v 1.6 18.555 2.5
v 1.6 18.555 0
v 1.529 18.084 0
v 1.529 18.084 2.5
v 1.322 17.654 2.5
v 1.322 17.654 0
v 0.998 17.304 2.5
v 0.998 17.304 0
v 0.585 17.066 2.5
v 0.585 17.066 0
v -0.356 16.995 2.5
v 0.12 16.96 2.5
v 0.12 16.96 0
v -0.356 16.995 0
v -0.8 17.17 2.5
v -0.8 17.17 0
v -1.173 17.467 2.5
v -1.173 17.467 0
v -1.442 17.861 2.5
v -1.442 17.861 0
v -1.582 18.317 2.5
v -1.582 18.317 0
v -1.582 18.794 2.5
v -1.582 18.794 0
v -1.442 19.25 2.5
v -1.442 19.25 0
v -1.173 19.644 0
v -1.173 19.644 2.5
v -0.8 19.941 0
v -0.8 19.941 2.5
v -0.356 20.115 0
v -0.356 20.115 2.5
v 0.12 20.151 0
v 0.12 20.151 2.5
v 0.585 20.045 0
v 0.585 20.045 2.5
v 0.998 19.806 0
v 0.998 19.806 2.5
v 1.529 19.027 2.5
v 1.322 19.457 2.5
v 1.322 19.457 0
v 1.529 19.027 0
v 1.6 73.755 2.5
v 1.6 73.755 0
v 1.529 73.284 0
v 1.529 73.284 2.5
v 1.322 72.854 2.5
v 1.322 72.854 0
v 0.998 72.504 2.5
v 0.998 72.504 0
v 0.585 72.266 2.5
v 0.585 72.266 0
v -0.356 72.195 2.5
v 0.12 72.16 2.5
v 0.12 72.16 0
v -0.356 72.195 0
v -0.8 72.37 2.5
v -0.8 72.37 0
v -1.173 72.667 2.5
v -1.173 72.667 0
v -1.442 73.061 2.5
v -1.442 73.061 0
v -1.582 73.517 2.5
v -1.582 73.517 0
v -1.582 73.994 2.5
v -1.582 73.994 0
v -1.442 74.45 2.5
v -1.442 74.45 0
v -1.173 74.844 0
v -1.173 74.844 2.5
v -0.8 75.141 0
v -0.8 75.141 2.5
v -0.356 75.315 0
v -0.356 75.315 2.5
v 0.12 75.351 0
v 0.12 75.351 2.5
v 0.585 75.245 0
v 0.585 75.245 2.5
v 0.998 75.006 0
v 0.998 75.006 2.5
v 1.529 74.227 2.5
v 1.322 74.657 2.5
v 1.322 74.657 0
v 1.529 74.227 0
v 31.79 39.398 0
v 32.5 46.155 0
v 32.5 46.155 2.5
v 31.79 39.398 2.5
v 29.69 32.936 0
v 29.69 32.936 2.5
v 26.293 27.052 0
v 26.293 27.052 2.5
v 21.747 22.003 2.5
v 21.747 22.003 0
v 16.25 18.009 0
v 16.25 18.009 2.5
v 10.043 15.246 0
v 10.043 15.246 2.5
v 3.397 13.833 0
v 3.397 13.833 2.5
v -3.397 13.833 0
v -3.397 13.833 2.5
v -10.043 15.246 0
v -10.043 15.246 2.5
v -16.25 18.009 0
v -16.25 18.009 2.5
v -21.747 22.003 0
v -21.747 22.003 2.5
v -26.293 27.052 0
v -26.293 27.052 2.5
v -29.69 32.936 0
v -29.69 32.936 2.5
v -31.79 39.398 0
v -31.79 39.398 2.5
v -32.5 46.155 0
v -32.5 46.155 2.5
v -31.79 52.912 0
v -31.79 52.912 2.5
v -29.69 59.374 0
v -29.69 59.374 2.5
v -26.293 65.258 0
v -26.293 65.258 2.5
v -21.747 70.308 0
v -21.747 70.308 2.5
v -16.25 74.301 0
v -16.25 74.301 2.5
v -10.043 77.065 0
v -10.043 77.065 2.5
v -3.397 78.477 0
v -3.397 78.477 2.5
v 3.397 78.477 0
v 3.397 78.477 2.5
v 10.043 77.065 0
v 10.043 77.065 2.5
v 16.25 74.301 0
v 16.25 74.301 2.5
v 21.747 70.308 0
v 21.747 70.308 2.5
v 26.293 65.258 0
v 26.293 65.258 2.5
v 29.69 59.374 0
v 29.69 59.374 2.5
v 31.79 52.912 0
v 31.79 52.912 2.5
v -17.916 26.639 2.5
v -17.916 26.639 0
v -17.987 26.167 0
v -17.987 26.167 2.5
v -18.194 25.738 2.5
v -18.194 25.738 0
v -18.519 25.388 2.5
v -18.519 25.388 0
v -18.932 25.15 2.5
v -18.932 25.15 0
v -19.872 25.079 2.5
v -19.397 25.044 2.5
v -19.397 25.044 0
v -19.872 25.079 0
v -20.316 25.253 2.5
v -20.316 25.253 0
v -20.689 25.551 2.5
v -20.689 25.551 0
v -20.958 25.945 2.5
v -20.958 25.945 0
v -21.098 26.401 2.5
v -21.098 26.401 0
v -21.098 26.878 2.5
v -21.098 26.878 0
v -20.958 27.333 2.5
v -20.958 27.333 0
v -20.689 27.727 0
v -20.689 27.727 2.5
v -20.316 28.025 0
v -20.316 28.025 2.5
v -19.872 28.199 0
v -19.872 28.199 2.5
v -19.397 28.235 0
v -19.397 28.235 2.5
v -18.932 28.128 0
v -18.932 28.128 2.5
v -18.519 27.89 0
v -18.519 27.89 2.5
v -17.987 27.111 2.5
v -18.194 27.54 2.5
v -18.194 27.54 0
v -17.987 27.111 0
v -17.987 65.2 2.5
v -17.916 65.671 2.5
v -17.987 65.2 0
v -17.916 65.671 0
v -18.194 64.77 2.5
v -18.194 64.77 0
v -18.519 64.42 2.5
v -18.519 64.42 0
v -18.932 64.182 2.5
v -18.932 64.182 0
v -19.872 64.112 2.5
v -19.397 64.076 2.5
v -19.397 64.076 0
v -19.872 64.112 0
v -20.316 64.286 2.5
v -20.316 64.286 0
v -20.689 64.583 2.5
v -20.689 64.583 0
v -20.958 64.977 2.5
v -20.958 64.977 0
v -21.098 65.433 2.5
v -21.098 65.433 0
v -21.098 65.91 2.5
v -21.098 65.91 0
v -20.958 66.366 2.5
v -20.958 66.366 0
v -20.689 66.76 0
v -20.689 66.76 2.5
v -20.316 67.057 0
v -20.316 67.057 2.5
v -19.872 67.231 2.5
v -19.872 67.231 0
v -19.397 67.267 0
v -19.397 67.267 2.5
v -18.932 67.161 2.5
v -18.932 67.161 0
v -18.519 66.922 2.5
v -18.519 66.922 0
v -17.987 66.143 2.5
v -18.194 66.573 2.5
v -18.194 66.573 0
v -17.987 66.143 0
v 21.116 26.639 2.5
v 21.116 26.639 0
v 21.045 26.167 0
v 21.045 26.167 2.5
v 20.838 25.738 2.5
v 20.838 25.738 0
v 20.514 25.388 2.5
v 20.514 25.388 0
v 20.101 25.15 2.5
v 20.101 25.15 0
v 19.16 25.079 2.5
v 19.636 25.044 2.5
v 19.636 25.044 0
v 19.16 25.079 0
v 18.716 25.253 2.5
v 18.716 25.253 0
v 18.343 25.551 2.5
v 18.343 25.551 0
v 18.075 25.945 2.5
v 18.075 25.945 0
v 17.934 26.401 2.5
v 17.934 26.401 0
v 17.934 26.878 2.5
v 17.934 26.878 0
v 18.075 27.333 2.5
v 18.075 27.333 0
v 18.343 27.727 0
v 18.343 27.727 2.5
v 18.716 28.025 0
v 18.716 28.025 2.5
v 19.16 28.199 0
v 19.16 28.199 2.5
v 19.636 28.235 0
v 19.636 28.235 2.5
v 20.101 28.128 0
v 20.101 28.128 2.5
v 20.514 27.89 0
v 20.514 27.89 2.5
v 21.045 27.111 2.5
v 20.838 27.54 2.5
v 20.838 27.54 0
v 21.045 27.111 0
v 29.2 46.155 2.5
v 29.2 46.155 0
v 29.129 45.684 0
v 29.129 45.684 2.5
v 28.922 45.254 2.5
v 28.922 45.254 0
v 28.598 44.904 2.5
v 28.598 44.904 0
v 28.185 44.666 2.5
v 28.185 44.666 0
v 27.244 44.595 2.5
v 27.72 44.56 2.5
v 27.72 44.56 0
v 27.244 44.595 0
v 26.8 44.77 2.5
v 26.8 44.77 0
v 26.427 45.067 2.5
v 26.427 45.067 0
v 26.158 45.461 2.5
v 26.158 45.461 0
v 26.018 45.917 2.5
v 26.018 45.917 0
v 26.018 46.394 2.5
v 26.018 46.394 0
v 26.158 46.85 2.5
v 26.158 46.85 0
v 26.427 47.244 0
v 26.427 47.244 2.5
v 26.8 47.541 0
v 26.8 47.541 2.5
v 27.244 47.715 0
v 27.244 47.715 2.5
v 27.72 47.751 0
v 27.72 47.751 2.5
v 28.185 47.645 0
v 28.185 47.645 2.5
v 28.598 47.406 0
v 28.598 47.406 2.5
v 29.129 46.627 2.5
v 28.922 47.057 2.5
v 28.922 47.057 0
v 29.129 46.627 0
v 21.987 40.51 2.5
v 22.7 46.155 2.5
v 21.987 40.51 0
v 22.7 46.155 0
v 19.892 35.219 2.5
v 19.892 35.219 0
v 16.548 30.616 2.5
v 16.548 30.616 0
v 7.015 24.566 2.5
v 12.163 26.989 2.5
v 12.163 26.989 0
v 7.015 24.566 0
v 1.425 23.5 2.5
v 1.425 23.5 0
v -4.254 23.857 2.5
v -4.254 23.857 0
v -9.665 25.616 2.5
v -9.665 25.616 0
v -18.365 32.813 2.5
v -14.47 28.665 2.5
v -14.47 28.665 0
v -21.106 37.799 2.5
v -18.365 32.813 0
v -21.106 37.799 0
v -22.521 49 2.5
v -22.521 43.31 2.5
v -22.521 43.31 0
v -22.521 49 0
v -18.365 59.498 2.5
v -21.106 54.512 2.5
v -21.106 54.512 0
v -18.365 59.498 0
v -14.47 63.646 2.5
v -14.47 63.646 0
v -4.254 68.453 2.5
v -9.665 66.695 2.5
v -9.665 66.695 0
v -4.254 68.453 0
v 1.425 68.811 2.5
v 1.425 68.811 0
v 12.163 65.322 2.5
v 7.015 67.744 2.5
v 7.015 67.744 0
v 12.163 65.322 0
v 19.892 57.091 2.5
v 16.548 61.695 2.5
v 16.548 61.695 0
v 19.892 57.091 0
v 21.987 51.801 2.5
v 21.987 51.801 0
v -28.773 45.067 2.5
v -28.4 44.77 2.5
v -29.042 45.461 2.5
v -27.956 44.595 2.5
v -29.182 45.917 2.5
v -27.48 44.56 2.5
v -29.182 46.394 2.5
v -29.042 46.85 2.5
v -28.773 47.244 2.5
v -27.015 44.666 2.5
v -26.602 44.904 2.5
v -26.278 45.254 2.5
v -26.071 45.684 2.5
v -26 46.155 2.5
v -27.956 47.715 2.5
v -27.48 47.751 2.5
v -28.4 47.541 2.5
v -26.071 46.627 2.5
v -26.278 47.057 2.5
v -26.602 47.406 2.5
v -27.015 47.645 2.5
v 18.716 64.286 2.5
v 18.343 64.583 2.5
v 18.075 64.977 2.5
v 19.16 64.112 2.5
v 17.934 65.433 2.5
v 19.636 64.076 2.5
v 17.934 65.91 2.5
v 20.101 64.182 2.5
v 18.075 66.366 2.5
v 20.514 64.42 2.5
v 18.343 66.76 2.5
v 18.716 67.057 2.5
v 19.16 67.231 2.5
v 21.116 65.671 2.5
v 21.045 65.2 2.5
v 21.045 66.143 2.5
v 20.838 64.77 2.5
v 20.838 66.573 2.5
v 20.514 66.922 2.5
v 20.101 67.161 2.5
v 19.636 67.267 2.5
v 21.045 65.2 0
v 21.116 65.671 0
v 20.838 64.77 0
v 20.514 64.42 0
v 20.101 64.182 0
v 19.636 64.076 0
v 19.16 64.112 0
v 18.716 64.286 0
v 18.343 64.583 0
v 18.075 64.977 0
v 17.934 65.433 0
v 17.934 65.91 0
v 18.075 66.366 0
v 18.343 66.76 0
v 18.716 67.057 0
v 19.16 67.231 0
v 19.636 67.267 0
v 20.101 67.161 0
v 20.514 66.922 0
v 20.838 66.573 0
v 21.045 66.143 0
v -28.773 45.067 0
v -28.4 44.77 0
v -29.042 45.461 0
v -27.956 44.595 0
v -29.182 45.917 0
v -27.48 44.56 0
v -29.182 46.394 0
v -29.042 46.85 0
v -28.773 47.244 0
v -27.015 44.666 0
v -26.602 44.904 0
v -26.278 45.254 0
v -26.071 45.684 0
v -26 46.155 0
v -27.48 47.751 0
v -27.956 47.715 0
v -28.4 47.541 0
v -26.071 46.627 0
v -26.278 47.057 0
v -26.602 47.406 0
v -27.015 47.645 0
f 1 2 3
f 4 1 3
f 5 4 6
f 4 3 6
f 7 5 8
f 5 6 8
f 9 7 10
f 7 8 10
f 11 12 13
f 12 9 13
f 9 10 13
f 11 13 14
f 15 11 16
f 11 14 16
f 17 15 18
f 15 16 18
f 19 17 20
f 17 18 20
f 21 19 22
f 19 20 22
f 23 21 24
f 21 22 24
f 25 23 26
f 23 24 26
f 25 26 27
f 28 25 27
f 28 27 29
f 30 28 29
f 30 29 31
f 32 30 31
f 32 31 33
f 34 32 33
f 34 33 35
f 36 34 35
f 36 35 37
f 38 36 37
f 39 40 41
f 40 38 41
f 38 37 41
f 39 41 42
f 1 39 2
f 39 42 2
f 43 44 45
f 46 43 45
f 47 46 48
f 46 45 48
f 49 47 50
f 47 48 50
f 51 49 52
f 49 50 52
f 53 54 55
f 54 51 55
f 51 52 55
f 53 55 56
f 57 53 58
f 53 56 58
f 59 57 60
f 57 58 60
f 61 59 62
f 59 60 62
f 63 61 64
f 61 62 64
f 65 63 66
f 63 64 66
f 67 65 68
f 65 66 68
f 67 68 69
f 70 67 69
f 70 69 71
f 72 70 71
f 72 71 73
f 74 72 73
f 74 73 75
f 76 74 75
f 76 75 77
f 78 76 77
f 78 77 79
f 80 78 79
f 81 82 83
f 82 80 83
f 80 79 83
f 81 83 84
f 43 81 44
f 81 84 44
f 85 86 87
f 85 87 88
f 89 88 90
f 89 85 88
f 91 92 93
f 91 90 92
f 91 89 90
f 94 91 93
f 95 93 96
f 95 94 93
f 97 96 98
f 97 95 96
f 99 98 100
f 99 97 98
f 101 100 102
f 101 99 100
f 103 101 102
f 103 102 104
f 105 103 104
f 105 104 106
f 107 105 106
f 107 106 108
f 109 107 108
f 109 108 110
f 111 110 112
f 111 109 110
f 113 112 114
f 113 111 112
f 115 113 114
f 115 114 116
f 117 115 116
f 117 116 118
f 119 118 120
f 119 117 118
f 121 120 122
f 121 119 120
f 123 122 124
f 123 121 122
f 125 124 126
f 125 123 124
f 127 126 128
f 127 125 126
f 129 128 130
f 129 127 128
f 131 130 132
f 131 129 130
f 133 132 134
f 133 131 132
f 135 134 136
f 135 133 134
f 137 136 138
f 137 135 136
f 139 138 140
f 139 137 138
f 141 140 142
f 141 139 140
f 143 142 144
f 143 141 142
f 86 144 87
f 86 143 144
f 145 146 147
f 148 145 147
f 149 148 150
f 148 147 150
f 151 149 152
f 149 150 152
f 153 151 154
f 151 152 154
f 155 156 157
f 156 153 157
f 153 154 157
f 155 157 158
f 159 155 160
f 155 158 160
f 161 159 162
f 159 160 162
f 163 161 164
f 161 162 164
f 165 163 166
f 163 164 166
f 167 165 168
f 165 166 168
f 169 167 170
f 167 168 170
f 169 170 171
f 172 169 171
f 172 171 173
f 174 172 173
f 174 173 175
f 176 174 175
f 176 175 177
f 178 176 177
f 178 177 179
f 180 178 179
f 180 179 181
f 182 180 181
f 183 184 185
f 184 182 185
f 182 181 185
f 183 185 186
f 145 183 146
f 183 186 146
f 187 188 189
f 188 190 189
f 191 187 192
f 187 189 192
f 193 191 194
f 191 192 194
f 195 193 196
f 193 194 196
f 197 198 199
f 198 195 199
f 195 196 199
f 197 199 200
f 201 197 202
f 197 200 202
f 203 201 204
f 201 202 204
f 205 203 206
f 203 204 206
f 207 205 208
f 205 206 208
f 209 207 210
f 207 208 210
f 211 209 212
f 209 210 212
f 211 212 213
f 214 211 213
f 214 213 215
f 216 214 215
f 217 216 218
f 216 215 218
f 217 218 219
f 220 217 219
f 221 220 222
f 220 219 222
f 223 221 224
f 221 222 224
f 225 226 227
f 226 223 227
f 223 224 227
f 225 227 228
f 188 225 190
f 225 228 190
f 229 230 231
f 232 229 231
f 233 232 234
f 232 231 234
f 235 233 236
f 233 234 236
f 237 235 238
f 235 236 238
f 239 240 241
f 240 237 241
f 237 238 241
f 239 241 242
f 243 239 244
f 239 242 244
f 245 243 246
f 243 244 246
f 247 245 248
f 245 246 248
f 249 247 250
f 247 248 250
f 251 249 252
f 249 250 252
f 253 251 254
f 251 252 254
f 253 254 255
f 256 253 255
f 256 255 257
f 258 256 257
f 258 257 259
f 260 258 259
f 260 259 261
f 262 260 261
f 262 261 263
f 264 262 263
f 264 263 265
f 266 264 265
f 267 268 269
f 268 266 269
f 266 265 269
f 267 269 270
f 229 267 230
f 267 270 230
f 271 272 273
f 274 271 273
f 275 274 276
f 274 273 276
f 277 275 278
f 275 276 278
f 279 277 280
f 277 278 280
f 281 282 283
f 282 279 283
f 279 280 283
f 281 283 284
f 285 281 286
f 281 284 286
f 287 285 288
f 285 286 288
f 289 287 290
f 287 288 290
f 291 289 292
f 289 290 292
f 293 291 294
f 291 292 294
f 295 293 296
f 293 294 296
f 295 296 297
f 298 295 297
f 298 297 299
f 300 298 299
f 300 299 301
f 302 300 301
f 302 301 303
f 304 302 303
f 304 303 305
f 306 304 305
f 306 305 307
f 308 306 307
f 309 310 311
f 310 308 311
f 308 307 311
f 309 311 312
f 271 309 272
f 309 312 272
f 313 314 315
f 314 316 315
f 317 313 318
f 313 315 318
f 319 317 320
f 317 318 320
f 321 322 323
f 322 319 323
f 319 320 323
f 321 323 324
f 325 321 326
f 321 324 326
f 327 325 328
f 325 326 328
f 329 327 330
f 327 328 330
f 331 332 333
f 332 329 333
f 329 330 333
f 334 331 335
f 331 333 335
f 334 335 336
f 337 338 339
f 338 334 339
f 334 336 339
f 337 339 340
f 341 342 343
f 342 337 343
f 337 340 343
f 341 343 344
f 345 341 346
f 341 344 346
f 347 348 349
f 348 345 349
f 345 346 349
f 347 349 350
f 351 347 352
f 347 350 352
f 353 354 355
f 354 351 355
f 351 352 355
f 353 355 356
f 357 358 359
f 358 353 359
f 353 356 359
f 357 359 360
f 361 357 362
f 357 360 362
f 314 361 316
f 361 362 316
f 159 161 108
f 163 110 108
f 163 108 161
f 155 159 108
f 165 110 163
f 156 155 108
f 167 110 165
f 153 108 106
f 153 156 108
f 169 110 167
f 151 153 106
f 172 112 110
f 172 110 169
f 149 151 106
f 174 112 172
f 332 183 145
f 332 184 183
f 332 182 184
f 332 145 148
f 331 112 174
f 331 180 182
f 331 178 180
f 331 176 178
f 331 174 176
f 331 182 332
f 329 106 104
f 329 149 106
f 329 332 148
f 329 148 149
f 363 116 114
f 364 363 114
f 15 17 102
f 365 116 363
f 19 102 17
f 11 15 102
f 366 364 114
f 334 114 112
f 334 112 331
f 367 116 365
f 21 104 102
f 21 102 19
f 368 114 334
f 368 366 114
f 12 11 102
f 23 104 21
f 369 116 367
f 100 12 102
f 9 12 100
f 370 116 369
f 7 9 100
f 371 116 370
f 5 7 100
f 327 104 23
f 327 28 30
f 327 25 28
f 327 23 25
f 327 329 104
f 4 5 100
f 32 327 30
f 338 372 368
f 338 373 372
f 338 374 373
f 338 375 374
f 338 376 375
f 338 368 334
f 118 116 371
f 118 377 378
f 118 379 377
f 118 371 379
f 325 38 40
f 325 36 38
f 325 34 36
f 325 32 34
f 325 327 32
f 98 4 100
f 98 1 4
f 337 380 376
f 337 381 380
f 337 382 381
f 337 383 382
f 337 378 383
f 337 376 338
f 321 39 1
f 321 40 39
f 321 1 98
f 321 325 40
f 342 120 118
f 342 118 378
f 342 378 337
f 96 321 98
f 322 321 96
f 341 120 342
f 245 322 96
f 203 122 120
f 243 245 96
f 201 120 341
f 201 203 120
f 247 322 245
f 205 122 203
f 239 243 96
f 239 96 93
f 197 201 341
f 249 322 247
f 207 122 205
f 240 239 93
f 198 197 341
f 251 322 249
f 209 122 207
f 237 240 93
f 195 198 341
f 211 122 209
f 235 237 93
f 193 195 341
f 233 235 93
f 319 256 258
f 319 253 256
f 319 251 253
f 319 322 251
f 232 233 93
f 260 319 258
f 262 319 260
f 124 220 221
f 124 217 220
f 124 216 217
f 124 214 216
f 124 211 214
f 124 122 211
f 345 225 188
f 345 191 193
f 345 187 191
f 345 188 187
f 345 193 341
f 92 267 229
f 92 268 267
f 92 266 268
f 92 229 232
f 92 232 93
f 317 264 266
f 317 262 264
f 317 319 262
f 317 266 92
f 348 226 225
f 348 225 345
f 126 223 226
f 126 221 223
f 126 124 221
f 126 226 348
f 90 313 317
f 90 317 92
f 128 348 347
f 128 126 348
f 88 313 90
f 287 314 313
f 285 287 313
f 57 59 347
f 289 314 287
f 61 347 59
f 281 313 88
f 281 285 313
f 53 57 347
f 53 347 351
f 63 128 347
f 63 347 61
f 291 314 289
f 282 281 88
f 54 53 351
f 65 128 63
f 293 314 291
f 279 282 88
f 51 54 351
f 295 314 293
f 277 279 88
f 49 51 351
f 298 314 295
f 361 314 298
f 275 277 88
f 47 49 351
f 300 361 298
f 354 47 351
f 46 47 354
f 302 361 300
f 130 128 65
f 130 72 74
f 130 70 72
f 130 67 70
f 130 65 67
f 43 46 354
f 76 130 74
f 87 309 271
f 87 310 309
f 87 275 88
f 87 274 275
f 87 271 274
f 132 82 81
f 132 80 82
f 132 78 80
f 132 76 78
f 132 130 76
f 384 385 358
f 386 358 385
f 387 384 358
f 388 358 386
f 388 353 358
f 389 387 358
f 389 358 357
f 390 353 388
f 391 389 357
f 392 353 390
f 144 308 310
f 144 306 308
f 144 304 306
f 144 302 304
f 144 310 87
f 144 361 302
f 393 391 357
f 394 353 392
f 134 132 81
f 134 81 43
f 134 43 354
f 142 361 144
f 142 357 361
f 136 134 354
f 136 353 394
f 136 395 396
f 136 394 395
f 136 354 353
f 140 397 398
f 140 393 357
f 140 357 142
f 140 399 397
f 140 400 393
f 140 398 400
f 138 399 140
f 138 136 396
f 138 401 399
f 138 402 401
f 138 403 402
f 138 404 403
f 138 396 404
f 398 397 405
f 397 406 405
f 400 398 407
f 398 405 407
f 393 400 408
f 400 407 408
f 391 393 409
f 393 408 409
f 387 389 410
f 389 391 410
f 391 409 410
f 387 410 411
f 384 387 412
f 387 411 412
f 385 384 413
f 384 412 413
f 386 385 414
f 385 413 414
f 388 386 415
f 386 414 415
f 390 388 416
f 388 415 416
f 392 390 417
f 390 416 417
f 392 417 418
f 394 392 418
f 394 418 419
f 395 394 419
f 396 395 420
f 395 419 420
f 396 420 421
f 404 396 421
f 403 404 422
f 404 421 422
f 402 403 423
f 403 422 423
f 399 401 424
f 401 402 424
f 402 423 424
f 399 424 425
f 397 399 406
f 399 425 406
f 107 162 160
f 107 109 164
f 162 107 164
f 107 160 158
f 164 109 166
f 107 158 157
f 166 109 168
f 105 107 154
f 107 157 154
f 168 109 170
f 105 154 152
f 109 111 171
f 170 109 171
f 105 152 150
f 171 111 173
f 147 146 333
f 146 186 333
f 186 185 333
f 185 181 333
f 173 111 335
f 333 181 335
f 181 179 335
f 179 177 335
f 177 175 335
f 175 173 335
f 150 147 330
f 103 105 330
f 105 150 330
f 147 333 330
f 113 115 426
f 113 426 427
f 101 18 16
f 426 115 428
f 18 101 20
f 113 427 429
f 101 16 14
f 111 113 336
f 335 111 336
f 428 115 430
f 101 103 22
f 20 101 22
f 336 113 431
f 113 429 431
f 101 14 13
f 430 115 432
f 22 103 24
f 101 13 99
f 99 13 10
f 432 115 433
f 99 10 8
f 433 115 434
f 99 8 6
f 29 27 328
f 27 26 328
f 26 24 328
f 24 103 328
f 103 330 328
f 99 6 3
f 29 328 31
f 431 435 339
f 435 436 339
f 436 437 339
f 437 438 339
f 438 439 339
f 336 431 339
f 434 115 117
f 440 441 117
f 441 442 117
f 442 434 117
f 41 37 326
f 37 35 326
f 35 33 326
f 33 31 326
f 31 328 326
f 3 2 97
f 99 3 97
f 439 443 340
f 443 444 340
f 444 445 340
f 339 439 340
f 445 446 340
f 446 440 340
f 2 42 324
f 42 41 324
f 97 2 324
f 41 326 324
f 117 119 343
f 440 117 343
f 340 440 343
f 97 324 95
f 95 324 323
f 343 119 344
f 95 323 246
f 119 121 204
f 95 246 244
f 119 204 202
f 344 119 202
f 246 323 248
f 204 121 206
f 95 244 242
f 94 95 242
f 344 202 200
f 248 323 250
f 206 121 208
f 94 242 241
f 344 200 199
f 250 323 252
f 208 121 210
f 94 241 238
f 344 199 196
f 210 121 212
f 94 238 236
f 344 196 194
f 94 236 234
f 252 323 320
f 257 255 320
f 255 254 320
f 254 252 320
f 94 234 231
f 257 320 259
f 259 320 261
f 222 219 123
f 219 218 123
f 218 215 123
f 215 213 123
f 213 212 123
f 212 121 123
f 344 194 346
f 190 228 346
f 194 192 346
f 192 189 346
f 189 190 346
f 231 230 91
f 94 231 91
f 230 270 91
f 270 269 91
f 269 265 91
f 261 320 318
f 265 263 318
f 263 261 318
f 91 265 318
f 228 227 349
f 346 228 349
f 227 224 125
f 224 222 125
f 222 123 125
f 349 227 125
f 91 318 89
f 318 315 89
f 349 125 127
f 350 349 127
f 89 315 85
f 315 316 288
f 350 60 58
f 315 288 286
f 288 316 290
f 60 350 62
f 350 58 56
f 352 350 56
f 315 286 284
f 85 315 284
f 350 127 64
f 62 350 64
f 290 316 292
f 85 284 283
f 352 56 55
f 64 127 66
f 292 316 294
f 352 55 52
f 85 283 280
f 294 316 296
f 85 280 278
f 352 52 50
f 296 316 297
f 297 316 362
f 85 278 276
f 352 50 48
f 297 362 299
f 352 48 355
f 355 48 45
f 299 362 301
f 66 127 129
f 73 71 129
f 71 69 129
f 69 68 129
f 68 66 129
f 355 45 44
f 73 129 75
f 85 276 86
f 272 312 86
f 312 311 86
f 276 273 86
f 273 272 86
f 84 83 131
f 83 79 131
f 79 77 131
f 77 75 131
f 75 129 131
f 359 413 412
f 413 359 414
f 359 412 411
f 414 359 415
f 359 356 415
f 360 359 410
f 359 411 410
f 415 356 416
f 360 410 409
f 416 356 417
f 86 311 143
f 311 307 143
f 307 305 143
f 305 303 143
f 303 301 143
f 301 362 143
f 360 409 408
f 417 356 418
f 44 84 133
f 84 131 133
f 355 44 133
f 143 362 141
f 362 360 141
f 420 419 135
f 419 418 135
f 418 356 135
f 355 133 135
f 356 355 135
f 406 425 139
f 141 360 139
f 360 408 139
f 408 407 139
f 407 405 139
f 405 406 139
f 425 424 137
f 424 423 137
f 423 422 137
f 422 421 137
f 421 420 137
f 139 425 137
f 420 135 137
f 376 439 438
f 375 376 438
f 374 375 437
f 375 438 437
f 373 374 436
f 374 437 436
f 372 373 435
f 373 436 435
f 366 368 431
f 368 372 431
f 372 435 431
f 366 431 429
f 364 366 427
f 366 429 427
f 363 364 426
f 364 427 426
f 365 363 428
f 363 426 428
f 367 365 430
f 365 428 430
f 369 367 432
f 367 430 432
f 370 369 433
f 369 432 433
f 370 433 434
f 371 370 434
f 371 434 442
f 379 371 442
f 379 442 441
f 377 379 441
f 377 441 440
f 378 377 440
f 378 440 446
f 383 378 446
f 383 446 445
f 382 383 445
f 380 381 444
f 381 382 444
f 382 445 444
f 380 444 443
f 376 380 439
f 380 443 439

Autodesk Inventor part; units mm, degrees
ref_plane "YZ Plane" through (0, 0, 0) normal (1, 0, 0) x (0, 1, 0)
ref_plane "XZ Plane" through (0, 0, 0) normal (0, 1, 0) x (-1, 0, 0)
ref_plane "XY Plane" through (0, 0, 0) normal (0, 0, 1) x (1, 0, 0)
sketch "スケッチ1" plane through (0, 0, 0) normal (0, 0, 1) x (1, 0, 0)
  circle A0 centre (0, 46.1553) radius 11.5 projected
  circle A1 centre (15, 0.6557) radius 1.6 projected
  circle A2 centre (-15, 0.6557) radius 1.6 projected
  circle A3 centre (15, -29.3443) radius 1.6 projected
  circle A4 centre (15, -59.3443) radius 1.6 projected
  circle A5 centre (-15, -29.3443) radius 1.6 projected
  circle A6 centre (-15, -59.3443) radius 1.6 projected
  circle A7 centre (13.5, 17.896) radius 1.1 projected
  circle A8 centre (13.5, 44.896) radius 1.1 projected
  circle A9 centre (-13.5, 17.896) radius 1.1 projected
  circle A10 centre (-13.5, 44.896) radius 1.1 projected
  line L0 (-22.5, 19.3457) -> (-22.5, -66.8443) projected
  line L1 (-22.5, -66.8443) -> (22.5, -66.8443) projected
  line L2 (22.5, -66.8443) -> (22.5, 19.3457) projected
  arc A11 (22.5, 19.3457) -> (-22.5, 19.3457) centre (0, 46.1553) ccw projected
  circle A12 centre (0, 46.1553) radius 5 projected
  circle A13 centre (3.8451, 52.0046) radius 0.8 projected
  circle A14 centre (6.855, 47.5725) radius 0.8 projected
  circle A15 centre (5.8494, 42.3101) radius 0.8 projected
  circle A16 centre (1.4172, 39.3002) radius 0.8 projected
  circle A17 centre (-3.8451, 40.3059) radius 0.8 projected
  circle A18 centre (-6.855, 44.738) radius 0.8 projected
  circle A19 centre (-5.8494, 50.0004) radius 0.8 projected
  circle A20 centre (-1.4172, 53.0103) radius 0.8 projected
  circle A21 centre (0, 46.1553) radius 10 projected
  circle A22 centre (0, 46.1553) radius 32.5
  circle A23 centre (0, 46.1553) radius 22.7
  circle A24 centre (0, 46.1553) radius 22.7 construction
  line L3 (0, 68.8553) -> (0, 78.6553) construction
  circle A25 centre (0, 73.7553) radius 1.6
  circle A26 centre (-19.5161, 65.6714) radius 1.6
  circle A27 centre (-27.6, 46.1553) radius 1.6
  circle A28 centre (-19.5161, 26.6391) radius 1.6
  circle A29 centre (0, 18.5553) radius 1.6
  circle A30 centre (19.5161, 26.6391) radius 1.6
  circle A31 centre (27.6, 46.1553) radius 1.6
  circle A32 centre (19.5161, 65.6714) radius 1.6
  circle A33 centre (0, 46.1553) radius 27.6 construction
  point P0 (0, 0)
  dimension "d0" = 65
  dimension "d1" = 45.4
  dimension "d3" = 3.2
  dimension "d6" = 360
  dimension "d13" = 27.6
  dimension "d14" = 55.2
extrude "押し出し1" add sketch "スケッチ1" along normal blind 2.5 contours A7 | A9 | A22
properties part number "軸受けワッシャA_ダブルスラスト用(t2_ジュラコン)" material "アルミニウム 6061"
